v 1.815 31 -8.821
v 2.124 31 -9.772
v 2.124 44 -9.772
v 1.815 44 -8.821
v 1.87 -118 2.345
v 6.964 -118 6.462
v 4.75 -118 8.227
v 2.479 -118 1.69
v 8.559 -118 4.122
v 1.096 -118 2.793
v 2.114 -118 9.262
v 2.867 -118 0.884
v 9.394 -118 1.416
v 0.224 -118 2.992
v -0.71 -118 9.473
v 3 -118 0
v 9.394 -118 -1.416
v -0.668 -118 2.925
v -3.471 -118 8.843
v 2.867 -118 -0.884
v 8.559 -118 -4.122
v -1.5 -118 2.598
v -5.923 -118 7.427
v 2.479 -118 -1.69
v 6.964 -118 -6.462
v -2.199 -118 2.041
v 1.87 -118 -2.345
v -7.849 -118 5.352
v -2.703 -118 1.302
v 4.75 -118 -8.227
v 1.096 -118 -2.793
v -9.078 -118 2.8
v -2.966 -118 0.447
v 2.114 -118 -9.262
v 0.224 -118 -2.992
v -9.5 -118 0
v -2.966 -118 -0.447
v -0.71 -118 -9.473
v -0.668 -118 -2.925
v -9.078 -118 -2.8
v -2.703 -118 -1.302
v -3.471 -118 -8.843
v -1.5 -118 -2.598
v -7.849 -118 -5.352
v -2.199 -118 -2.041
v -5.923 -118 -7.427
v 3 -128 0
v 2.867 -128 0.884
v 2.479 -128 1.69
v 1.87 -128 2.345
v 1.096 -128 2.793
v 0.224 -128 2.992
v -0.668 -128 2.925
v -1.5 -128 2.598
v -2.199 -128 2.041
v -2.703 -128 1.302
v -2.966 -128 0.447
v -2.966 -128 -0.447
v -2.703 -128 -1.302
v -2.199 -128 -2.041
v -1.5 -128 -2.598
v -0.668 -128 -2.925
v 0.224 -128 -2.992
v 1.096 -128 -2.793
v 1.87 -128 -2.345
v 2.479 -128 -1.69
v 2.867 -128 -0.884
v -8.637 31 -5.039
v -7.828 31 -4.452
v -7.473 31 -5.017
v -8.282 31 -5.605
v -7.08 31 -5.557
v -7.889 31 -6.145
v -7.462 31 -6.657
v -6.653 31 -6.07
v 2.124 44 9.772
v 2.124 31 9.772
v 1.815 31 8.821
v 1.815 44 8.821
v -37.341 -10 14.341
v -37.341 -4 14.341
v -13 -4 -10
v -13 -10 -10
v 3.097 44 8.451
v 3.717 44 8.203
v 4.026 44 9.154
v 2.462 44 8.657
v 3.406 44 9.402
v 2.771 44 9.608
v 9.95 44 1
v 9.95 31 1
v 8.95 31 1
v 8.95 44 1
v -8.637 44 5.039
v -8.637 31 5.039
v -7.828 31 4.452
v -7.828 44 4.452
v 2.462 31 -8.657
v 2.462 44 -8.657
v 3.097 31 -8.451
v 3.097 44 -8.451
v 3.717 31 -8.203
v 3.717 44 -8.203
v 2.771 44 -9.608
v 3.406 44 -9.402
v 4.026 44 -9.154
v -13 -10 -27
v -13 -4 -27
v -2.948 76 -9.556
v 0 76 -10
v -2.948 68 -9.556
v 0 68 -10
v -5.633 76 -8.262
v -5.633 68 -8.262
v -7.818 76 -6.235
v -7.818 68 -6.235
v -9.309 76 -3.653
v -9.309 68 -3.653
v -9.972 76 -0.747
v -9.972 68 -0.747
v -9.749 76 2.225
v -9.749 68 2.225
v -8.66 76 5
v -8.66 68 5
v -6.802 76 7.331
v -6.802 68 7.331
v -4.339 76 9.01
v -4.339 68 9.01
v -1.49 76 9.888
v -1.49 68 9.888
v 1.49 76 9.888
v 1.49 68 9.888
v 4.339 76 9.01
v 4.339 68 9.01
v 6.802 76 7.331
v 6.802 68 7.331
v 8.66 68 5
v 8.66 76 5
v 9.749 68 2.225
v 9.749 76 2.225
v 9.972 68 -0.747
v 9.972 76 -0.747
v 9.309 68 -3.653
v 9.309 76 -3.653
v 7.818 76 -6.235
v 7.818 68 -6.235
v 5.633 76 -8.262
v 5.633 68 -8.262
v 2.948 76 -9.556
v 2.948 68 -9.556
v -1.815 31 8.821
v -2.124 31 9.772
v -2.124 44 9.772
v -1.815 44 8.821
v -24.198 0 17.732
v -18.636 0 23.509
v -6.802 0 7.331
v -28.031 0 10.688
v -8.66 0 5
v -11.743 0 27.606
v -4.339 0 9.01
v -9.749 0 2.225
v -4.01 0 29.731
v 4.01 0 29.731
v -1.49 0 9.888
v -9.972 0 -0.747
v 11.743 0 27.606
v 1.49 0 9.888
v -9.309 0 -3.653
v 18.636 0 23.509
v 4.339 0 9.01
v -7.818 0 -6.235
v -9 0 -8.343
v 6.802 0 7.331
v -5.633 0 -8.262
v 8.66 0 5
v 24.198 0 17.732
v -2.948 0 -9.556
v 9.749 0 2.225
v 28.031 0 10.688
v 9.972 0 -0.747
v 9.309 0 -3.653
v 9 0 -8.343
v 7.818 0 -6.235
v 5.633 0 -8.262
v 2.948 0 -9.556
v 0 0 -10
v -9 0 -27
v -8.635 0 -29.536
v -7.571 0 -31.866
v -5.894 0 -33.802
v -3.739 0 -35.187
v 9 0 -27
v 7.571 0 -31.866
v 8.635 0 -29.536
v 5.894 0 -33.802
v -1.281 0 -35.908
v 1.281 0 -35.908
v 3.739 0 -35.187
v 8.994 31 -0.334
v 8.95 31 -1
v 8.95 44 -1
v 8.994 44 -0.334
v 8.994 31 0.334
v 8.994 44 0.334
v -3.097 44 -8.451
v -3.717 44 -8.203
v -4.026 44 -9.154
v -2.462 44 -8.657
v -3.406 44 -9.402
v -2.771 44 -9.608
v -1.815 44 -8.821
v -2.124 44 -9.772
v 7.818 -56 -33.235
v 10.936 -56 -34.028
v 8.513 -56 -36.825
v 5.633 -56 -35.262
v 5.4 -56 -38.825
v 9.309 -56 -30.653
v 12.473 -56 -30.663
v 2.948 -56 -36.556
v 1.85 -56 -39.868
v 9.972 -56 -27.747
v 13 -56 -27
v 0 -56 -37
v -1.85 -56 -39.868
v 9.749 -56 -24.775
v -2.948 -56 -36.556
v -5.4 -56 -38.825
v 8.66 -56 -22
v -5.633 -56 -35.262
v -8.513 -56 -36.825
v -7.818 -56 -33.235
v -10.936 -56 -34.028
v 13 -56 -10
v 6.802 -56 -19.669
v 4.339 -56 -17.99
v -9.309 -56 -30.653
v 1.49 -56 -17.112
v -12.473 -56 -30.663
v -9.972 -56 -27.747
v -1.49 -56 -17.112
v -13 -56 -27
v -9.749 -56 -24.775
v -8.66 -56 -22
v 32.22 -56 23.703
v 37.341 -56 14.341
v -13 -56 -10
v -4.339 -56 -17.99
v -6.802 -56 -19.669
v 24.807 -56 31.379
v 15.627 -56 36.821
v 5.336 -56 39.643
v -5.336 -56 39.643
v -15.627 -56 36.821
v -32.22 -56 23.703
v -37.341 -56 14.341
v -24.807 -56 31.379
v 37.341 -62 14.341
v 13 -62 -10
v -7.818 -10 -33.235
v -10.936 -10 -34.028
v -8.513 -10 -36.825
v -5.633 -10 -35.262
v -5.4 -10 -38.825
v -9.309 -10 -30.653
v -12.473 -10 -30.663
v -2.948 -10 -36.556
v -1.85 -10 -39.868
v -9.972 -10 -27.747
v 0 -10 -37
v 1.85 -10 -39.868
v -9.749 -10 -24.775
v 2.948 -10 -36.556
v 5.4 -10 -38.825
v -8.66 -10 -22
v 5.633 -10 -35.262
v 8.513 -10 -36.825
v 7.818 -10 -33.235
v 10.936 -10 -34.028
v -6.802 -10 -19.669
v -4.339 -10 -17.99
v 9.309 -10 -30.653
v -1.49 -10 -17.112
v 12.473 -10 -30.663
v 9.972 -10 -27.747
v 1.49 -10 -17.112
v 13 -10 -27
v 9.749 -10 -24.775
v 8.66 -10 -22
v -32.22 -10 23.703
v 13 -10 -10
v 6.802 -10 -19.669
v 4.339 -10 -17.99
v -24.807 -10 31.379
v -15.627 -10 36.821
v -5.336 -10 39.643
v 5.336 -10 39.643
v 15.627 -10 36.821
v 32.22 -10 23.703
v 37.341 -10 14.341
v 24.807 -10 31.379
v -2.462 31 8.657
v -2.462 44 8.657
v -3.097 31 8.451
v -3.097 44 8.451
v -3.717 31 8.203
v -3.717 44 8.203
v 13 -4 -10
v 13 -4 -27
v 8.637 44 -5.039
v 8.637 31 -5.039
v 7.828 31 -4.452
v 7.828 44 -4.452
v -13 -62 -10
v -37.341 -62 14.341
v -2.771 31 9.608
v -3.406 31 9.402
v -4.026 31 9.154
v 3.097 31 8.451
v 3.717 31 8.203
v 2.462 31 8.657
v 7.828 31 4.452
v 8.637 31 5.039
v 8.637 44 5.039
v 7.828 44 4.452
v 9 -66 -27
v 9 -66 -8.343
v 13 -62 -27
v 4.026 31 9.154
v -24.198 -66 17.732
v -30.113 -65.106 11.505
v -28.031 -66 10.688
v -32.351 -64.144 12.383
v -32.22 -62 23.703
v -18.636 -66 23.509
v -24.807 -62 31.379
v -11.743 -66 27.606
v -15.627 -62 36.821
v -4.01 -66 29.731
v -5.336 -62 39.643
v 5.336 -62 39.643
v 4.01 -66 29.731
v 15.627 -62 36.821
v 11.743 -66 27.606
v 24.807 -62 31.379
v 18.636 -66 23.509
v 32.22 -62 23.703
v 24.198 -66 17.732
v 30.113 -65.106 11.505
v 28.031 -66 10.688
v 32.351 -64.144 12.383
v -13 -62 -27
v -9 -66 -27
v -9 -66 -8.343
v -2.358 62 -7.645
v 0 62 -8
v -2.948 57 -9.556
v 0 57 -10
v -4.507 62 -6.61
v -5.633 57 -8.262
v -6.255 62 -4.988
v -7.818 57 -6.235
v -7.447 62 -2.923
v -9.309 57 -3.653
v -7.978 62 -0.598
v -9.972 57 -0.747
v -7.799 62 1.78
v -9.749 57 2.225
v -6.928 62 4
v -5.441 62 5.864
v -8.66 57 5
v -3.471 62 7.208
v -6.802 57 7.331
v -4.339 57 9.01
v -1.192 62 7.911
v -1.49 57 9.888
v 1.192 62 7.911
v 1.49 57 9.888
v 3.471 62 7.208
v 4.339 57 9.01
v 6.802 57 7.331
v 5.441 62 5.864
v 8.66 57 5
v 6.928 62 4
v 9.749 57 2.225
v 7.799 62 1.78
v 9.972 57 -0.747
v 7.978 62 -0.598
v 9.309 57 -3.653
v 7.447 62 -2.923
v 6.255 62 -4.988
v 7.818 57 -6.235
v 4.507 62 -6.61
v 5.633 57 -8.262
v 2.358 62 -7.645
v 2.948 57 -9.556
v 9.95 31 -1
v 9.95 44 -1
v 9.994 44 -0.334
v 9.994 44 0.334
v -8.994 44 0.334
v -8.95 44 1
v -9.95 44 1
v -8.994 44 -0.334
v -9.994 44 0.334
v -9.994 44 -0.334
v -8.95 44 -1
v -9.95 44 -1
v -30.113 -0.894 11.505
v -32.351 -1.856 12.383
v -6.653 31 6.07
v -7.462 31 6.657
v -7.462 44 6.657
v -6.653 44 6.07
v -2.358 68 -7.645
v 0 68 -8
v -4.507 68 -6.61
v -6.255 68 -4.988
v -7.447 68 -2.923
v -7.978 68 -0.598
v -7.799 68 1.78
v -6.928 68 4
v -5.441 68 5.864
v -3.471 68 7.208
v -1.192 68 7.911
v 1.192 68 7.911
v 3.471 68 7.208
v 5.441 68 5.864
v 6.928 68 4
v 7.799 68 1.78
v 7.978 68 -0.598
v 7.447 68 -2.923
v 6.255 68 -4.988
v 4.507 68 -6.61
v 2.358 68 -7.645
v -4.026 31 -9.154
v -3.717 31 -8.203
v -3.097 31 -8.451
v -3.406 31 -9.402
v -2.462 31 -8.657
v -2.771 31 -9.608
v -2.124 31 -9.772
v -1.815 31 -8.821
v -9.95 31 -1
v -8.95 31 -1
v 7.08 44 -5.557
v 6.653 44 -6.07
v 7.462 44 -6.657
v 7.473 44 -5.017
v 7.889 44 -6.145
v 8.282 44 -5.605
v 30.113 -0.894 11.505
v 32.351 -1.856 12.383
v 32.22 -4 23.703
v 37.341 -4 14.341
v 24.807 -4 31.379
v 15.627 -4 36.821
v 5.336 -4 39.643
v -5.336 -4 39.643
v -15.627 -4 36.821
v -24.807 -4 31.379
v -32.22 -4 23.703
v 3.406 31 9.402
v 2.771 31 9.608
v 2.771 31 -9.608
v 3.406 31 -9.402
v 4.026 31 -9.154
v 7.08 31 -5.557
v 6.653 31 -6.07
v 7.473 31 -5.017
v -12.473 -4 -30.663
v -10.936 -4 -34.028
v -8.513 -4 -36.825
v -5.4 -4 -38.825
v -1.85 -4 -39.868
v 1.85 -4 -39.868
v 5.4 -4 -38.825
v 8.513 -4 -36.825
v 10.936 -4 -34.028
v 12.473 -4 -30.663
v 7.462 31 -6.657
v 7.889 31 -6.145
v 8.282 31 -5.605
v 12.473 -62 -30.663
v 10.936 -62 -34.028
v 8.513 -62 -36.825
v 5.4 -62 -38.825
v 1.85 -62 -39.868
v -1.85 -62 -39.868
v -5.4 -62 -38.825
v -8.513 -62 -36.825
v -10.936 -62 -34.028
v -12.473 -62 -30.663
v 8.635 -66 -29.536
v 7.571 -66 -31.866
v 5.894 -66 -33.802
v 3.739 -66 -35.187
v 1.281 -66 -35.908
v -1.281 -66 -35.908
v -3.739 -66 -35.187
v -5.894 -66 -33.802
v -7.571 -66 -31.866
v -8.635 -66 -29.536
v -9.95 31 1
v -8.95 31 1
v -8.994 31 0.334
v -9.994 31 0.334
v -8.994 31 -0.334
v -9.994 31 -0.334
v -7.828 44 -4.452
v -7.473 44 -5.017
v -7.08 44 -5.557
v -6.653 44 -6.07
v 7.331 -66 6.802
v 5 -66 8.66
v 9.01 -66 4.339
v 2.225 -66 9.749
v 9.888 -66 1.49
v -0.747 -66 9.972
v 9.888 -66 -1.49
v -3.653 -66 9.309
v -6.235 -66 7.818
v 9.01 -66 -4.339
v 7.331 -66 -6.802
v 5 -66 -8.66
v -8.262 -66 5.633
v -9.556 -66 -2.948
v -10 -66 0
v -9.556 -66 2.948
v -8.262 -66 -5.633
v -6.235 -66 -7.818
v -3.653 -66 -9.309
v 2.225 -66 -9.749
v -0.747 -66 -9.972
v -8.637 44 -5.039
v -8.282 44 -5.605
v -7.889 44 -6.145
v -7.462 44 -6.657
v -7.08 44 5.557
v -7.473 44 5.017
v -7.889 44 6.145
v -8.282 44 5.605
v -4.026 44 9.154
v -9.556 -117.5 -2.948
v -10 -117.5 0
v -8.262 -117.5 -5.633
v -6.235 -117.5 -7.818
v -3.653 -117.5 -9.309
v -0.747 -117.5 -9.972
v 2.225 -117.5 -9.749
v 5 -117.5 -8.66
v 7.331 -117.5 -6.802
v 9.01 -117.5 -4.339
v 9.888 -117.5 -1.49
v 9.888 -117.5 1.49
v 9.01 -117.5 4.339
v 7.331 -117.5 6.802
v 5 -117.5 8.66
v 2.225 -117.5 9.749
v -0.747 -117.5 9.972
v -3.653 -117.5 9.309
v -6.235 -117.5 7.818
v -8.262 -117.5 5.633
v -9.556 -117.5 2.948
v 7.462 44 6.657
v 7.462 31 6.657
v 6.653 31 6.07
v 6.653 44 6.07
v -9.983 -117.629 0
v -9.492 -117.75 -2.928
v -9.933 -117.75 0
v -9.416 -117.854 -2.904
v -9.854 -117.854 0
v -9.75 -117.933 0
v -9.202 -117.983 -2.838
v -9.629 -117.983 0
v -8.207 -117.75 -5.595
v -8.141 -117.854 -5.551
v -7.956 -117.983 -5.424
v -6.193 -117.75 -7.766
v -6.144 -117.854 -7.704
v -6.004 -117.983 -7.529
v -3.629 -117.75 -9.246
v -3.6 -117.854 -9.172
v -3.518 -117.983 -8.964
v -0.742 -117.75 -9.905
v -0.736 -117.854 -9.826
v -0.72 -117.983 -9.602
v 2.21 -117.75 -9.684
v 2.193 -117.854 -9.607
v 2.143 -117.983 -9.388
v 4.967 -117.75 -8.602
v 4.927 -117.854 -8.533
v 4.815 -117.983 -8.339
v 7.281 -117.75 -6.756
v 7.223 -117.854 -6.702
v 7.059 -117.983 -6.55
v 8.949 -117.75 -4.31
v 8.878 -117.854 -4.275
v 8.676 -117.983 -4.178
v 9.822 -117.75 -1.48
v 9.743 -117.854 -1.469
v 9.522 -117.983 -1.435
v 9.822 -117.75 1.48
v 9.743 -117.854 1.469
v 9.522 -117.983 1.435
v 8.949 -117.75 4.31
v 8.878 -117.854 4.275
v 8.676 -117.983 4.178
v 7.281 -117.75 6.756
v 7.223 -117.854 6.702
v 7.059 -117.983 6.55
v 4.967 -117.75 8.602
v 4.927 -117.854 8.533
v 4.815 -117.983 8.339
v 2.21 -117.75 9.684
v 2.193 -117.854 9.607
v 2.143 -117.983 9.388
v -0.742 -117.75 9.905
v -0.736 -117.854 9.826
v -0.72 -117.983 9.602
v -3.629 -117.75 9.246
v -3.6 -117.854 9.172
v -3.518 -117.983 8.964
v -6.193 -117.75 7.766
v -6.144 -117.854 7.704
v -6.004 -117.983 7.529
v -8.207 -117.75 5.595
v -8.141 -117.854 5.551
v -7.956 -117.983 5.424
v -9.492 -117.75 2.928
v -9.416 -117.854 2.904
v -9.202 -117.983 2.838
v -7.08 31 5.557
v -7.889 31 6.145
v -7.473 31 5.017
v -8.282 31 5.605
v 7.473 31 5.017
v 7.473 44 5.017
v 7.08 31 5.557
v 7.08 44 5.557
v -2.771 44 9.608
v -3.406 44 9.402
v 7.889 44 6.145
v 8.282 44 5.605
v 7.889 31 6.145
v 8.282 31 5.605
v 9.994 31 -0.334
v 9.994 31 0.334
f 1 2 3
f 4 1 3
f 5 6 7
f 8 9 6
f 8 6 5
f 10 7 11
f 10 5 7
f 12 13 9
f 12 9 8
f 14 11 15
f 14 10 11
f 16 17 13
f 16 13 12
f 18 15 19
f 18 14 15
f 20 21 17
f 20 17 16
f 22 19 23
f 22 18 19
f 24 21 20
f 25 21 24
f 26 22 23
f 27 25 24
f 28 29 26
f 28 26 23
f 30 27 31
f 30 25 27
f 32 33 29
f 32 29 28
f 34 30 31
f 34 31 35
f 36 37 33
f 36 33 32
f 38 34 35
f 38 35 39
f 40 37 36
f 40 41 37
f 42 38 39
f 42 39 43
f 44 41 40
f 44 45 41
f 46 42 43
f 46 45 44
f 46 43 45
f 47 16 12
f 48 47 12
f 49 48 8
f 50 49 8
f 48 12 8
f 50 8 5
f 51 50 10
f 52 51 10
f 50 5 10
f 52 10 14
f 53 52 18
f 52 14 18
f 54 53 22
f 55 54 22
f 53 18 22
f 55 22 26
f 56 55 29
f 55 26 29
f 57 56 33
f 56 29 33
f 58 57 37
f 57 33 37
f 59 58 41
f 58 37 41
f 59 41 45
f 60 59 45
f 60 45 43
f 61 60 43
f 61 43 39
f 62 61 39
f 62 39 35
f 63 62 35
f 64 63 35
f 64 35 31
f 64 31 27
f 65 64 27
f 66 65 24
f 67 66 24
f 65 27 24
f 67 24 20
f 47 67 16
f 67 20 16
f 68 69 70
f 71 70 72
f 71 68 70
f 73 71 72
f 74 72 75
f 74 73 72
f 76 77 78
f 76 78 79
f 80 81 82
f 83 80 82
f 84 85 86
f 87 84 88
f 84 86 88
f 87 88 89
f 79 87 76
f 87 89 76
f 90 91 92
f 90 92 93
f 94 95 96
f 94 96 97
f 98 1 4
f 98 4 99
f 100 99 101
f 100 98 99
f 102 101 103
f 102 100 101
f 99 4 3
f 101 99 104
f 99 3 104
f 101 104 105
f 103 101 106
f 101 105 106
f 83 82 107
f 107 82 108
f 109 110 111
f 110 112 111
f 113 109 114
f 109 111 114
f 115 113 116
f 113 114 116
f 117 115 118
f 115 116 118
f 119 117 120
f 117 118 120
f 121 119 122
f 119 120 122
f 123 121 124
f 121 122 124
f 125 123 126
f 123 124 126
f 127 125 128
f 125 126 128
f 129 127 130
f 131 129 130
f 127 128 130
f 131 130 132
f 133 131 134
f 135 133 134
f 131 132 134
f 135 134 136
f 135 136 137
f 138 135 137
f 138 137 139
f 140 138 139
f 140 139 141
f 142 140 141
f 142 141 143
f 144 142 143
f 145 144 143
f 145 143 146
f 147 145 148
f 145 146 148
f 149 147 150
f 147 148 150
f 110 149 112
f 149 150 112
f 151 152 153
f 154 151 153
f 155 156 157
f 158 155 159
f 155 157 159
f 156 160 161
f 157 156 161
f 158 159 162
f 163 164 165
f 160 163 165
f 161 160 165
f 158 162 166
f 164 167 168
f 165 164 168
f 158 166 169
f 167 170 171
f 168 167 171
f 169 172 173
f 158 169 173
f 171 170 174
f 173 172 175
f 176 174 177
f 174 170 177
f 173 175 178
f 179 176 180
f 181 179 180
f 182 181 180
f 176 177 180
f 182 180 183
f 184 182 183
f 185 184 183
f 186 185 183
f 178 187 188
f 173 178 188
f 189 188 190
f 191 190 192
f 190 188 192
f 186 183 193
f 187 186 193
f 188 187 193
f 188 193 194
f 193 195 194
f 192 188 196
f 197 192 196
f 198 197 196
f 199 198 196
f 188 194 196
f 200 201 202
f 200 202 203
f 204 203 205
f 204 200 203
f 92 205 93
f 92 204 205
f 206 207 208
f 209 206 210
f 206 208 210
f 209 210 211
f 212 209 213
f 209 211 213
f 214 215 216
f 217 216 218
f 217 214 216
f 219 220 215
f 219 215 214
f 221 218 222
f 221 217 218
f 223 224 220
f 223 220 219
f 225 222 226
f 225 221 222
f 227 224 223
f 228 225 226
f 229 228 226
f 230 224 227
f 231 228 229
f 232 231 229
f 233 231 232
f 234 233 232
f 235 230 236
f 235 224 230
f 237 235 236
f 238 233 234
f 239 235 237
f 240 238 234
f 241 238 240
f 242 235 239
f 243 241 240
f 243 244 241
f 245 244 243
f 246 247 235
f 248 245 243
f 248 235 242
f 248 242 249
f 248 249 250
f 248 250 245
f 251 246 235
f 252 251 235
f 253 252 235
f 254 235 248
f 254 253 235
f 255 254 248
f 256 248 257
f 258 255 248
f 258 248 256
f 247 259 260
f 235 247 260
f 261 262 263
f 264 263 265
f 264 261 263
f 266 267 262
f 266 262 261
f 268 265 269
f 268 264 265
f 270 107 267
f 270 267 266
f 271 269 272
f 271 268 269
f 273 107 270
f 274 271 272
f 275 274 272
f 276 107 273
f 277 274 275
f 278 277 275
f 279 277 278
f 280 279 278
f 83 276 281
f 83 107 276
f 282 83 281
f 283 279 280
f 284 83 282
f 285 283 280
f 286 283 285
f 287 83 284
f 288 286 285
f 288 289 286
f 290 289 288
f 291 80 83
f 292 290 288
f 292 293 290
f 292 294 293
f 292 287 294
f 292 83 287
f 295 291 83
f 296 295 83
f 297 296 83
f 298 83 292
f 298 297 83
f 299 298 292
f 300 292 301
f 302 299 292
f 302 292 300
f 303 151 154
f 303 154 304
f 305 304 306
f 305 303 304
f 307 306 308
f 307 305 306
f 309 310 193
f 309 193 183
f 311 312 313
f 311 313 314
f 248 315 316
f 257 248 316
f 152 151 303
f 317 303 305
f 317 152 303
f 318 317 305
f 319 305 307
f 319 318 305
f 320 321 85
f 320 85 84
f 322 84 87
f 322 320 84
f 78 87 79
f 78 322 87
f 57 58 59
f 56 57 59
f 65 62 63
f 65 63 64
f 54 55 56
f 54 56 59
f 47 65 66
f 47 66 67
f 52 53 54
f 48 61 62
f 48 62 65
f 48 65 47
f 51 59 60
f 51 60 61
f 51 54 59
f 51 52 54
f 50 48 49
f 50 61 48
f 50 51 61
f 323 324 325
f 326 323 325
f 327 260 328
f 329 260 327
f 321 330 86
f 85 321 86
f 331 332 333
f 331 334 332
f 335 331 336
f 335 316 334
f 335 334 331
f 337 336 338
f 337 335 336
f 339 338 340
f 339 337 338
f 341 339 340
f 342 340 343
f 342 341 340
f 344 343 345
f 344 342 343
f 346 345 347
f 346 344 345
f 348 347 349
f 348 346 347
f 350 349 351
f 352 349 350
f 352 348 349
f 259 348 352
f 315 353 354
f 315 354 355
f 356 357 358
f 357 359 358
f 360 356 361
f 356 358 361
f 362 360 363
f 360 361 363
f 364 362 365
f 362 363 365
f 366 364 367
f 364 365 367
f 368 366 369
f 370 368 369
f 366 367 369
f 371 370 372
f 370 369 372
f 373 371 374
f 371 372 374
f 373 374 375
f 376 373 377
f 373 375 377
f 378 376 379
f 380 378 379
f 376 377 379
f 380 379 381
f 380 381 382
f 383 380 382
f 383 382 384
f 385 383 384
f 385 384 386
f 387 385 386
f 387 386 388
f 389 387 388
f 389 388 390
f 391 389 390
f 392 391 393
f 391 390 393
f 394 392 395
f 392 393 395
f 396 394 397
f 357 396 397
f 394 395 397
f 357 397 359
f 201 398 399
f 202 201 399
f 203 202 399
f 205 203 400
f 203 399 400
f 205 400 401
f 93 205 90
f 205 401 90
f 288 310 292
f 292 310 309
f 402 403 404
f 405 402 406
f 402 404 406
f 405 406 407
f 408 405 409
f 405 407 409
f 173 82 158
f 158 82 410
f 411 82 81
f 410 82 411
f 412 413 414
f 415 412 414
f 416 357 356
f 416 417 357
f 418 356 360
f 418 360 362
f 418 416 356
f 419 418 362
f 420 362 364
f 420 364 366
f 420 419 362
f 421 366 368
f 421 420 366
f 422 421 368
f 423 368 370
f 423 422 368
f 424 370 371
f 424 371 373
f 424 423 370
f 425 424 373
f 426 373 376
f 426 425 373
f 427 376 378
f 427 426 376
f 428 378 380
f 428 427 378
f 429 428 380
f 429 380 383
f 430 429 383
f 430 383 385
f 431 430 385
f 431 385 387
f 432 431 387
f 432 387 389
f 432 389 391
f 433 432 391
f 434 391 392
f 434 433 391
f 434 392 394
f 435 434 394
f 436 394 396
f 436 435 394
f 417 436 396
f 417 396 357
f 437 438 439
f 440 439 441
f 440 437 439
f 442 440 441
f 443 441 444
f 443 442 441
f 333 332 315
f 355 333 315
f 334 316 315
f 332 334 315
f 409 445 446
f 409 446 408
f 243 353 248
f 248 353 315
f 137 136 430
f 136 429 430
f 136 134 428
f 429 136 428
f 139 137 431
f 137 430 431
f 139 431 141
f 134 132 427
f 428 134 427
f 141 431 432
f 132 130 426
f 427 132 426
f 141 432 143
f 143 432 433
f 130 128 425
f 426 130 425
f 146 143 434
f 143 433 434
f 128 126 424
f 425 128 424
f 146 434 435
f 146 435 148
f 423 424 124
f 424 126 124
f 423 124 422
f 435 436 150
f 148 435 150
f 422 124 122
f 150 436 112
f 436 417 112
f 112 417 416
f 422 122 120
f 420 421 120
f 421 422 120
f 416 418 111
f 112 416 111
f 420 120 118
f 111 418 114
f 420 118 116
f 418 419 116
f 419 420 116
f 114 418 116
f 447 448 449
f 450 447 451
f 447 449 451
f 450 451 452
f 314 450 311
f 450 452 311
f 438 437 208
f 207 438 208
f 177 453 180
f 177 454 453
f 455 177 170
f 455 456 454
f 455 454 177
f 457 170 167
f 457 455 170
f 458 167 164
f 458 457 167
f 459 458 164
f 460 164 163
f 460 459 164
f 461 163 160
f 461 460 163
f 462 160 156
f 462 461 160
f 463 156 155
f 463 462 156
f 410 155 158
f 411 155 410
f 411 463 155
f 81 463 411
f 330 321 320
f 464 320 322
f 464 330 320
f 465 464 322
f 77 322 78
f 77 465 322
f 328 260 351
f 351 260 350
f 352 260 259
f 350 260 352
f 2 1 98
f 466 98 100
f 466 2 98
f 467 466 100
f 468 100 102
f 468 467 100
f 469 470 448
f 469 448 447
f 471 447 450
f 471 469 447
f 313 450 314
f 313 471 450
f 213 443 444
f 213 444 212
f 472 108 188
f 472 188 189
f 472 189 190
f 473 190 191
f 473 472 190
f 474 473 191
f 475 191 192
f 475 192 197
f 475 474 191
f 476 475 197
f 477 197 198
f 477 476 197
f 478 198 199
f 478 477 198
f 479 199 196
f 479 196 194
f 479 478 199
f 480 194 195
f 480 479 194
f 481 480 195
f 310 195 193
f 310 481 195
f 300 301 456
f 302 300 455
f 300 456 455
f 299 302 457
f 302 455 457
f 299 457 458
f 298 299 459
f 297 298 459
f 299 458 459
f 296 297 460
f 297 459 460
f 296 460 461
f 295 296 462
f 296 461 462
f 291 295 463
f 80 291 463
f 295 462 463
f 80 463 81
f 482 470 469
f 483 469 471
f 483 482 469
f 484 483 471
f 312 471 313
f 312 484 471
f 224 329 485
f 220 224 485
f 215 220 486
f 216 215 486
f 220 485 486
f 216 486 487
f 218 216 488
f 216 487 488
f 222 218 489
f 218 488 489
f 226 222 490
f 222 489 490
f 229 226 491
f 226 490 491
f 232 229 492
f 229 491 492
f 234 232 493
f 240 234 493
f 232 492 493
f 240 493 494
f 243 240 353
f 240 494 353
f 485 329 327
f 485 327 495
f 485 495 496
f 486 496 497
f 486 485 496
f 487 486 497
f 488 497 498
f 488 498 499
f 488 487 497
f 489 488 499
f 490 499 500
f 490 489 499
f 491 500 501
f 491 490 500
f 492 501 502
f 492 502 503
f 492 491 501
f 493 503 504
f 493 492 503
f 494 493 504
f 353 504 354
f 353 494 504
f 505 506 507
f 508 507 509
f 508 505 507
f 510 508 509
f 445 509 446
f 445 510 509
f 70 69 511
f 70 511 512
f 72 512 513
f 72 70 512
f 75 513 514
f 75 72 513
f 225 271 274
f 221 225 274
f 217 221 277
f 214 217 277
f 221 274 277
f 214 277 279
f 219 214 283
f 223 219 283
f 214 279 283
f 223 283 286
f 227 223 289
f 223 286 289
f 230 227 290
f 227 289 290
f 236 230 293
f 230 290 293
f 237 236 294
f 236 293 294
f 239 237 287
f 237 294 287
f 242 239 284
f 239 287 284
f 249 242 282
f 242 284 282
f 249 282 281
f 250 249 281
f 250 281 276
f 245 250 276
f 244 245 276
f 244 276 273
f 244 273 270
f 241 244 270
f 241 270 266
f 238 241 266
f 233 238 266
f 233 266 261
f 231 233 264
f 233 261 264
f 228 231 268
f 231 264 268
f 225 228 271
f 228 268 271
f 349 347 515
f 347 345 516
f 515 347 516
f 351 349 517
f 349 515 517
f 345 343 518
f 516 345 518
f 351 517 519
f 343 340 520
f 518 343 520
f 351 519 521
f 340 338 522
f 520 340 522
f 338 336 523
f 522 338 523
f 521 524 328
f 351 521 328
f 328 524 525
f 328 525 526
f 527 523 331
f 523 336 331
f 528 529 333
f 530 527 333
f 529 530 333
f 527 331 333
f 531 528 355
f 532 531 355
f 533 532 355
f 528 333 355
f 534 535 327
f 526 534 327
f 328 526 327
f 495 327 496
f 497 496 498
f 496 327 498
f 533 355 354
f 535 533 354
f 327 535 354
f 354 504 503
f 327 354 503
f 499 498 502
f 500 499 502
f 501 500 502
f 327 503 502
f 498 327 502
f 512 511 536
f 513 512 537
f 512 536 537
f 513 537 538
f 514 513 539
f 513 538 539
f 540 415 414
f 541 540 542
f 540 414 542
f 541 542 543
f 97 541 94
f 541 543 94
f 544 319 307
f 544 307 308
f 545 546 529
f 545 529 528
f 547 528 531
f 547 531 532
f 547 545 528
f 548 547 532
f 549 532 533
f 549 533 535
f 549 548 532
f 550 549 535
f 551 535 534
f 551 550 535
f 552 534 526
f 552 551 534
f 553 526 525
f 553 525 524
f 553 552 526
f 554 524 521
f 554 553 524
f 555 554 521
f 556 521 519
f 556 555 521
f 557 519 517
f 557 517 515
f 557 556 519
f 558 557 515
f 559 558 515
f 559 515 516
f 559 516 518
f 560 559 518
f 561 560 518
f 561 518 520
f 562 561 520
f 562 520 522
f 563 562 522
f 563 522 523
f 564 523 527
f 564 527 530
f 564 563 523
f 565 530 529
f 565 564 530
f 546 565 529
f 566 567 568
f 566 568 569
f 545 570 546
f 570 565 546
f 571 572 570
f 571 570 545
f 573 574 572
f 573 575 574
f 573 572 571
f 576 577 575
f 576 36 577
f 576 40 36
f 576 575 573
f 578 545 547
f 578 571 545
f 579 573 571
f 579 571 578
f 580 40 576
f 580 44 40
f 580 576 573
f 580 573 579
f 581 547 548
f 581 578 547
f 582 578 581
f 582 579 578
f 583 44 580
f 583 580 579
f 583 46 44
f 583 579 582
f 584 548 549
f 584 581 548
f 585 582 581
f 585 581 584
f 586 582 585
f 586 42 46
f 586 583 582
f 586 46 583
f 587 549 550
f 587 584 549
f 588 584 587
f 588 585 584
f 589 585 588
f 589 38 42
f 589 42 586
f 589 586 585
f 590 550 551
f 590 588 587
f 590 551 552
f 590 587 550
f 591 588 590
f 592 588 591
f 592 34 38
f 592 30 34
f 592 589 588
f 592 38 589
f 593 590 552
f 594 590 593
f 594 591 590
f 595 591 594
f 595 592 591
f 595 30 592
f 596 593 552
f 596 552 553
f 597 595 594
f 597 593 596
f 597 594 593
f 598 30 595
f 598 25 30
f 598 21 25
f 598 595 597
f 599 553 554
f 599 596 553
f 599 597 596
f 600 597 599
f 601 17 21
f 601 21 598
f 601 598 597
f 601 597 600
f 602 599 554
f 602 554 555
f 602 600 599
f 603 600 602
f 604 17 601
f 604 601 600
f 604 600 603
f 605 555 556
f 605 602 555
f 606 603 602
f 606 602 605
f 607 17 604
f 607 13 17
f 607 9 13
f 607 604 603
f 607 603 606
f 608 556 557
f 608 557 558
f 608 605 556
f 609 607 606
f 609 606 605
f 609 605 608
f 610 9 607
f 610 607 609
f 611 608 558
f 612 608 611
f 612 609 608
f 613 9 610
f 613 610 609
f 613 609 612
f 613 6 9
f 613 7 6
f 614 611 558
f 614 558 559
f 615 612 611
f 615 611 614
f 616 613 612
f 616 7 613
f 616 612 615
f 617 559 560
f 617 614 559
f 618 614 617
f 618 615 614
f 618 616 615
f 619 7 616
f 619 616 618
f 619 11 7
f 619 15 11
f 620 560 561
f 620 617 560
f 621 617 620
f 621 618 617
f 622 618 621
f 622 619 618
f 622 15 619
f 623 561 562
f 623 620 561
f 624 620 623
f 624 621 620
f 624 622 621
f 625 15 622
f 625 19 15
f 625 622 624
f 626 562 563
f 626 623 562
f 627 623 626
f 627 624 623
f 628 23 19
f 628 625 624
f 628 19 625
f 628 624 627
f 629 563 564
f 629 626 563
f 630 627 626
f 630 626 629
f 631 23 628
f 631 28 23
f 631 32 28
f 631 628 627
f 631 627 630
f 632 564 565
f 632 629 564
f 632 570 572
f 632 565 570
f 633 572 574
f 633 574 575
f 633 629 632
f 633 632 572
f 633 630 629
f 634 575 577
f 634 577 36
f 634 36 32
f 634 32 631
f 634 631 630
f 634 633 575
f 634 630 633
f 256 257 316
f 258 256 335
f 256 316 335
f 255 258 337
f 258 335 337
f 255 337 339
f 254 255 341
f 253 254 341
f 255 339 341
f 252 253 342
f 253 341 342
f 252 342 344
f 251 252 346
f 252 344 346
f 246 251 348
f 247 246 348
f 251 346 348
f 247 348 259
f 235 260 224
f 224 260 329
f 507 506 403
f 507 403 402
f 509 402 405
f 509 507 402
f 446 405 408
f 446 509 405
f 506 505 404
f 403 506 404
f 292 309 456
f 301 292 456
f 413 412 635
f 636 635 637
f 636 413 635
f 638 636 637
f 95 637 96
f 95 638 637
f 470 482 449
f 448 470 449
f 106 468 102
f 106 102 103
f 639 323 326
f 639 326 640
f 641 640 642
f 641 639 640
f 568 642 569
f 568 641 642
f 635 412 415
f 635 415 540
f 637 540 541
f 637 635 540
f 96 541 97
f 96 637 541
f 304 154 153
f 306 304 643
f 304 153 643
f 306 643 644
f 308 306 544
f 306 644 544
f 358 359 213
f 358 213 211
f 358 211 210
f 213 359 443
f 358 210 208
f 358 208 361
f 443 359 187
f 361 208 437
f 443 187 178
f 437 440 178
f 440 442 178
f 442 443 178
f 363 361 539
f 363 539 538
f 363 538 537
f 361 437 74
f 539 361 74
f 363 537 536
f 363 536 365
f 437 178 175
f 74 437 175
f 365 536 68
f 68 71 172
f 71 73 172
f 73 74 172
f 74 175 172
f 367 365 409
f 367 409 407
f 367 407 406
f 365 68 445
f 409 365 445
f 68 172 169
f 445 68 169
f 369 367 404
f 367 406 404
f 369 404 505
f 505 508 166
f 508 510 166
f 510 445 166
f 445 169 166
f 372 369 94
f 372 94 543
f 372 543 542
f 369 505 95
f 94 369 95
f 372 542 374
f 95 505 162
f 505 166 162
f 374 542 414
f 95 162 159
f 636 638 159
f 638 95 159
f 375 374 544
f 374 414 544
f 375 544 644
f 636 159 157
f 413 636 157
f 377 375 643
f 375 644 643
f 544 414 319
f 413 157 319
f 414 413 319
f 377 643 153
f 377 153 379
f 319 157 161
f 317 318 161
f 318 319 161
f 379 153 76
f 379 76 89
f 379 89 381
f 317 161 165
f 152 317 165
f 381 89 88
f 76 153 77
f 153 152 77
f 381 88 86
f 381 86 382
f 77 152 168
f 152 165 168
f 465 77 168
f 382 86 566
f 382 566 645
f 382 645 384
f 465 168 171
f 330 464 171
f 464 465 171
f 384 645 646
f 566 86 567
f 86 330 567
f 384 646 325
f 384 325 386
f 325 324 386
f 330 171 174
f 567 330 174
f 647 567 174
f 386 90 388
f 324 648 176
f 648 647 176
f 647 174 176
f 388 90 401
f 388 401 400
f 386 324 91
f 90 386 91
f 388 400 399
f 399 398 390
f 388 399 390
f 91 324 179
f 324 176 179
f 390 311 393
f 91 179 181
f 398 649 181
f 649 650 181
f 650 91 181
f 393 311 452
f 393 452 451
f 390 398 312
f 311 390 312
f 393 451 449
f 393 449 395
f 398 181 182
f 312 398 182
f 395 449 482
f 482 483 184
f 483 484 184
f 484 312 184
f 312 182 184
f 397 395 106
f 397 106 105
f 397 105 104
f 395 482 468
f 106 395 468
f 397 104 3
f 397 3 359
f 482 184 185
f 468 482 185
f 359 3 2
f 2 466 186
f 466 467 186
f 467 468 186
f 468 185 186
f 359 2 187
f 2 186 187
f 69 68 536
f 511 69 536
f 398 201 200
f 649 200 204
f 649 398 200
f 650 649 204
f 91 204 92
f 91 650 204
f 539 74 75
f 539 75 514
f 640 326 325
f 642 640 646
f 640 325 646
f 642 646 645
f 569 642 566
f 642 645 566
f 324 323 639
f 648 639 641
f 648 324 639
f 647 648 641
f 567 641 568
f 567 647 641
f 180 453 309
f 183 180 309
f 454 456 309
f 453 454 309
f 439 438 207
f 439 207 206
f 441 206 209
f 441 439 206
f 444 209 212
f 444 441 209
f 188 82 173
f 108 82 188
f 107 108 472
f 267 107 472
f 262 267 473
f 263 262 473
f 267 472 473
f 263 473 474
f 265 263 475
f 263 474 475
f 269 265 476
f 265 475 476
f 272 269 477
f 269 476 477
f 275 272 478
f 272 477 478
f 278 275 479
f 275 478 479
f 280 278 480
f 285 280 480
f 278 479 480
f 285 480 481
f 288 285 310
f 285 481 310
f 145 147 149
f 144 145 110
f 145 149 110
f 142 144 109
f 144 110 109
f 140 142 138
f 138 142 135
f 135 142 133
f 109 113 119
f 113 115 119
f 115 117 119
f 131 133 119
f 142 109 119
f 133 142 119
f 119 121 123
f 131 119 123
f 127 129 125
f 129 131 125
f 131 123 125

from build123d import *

# Parameters (mm, degrees)
SKETCH1_W                 = 6
SKETCH1_H                 = 8
CUT_EXTRUDE1_REACH        = 80.305
CUT_EXTRUDE1_START_RADIUS = 10
CUT_EXTRUDE1_END_RADIUS   = 10
SKETCH2_W                 = 13
SKETCH2_H                 = 2
CIRPATTERN1_COUNT         = 10
SKETCH3_R                 = 10
BOSS_EXTRUDE1_DEPTH       = 10
CHAMFER2_SIZE             = 4
CHAMFER6_SIZE             = 10
CHAMFER6_SIZE2            = 4
CHAMFER3_SIZE             = 4
CHAMFER5_SIZE             = 4
BODY_MOVE_COPY2_ANGLE     = 180
SKETCH5_R                 = 10
BOSS_EXTRUDE2_DEPTH       = 46
BOSS_EXTRUDE3_START       = 52
SKETCH6_R                 = 10
BOSS_EXTRUDE3_DEPTH       = 52
BOSS_EXTRUDE4_START       = 52
SKETCH6_3_R               = 3
BOSS_EXTRUDE4_DEPTH       = 10
FILLET1_R                 = 0.5


with BuildPart() as part:
    # Sketch1 → Revolve1 (revolve)
    with BuildSketch(Plane.YZ, mode=Mode.PRIVATE) as revolve1_sk:
        Polygon((57, 10), (0, 10), (0, 0), (62, 0), (62, 8), align=None)
        with Locations((65, 4)):
            Rectangle(SKETCH1_W, SKETCH1_H)
        Polygon((68, 10), (68, 8), (68, 0), (76, 0), (76, 10), align=None)
    revolve(revolve1_sk.sketch.rotate(Axis((0, -74.081666102, 0), (0, 1, 0)), 180), axis=Axis((0, -74.081666102, 0), (0, 1, 0)))

    # Cut-Extrude1: from a cylinder face, 80.305 long prism both ways, kept between that surface and its translate by the depth
    cut_extrude1_start = Plane(origin=(0, 37.5, 0), z_dir=(0, -1, 0)) * Cylinder(CUT_EXTRUDE1_START_RADIUS, 181.61, mode=Mode.PRIVATE)
    cut_extrude1_end = Plane(origin=(-1, 37.5, 0), z_dir=(0, -1, 0)) * Cylinder(CUT_EXTRUDE1_END_RADIUS, 181.61, mode=Mode.PRIVATE)
    # Sketch2 → Cut-Extrude1 (cut, from a surface)
    with BuildSketch(Plane.YZ, mode=Mode.PRIVATE) as cut_extrude1_sk1:
        with Locations((37.5, 0)):
            Rectangle(SKETCH2_W, SKETCH2_H)
    cut_extrude1_tool1 = extrude(cut_extrude1_sk1.sketch, amount=CUT_EXTRUDE1_REACH, both=True, mode=Mode.PRIVATE)
    cut_extrude1 = ((cut_extrude1_tool1 & cut_extrude1_start) - cut_extrude1_end).solids().sort_by_distance((9.449874, 37.5, 0))[0]
    add(cut_extrude1, mode=Mode.SUBTRACT)

    # CirPattern1: Cut-Extrude1 ×10 about axis
    cirpattern1_axis = Axis((0, 0, 0), (0, 1, 0))
    for i in range(1, CIRPATTERN1_COUNT):
        add(cut_extrude1.rotate(cirpattern1_axis, i * 360 / CIRPATTERN1_COUNT), mode=Mode.SUBTRACT)


with BuildPart() as body_2:
    # Sketch3 → Boss-Extrude1 (new body)
    # profile 1 of 2: a face of its own
    with BuildSketch(Plane.XZ):
        with BuildLine():
            Line((-37.340859119, 14.340859119), (-13, -10))
            Line((-13, -10), (-13, -27))
            ThreePointArc((-13, -27), (0, -40), (13, -27))
            Line((13, -27), (13, -10))
            Line((13, -10), (37.340859119, 14.340859119))
            ThreePointArc((37.340859119, 14.340859119), (0, 40), (-37.340859119, 14.340859119))
        make_face()
        with Locations(Location((0, 0, 0), (0, 0, 270))):
            Circle(SKETCH3_R, mode=Mode.SUBTRACT)
    # profile 2 of 2: a face of its own
    with BuildSketch(Plane.XZ):
        with Locations(Location((0, 0, 0), (0, 0, 270))):
            Circle(SKETCH3_R)
    extrude(amount=BOSS_EXTRUDE1_DEPTH)

    # Chamfer2
    chamfer2_edges = [body_2.edges().sort_by_distance(p)[0] for p in [
        (-13, 0, -18.5),
        (13, 0, -18.5),
        (0, 0, -40),
    ]]
    chamfer(chamfer2_edges, length=CHAMFER2_SIZE)

    # Chamfer6
    chamfer6_edges = [body_2.edges().sort_by_distance(p)[0] for p in [
        (0, 0, 40),
    ]]
    chamfer6_side = [body_2.faces().sort_by_distance(p)[0] for p in [
        (0, 0, 9.789093574),
    ]]
    chamfer(chamfer6_edges, length=CHAMFER6_SIZE, length2=CHAMFER6_SIZE2, reference=chamfer6_side[0])

    # Chamfer3
    chamfer3_edges = [body_2.edges().sort_by_distance(p)[0] for p in [
        (19.162771735, 0, -3.837228265),
    ]]
    chamfer(chamfer3_edges, length=CHAMFER3_SIZE)

    # Chamfer5
    chamfer5_edges = [body_2.edges().sort_by_distance(p)[0] for p in [
        (-19.162771735, 0, -3.837228265),
    ]]
    chamfer(chamfer5_edges, length=CHAMFER5_SIZE)


with BuildPart() as body_3:
    # Body-Move/Copy1: copy of body 2
    add(body_2.part.moved(Location((0, -36, 0))))


with BuildPart() as body_3_1:
    # Body-Move/Copy2: moved
    add(body_3.part.rotate(Axis((0, -51, 0), (0, 0, 1)), BODY_MOVE_COPY2_ANGLE))


with BuildPart() as body_2_1:
    add(body_2.part)

    add(body_3_1.part)  # Boss-Extrude2 merges body 3
    # Sketch5 → Boss-Extrude2 (add)
    with BuildSketch(Plane.XZ.offset(10)):
        with Locations(Location((0, -27, 0), (0, 0, 270))):
            Circle(SKETCH5_R)
    extrude(amount=BOSS_EXTRUDE2_DEPTH)

    # Sketch6 → Boss-Extrude3 (add)
    with BuildSketch(Plane.XZ.offset(66).offset(BOSS_EXTRUDE3_START)):
        with Locations(Location((0, 0, 0), (0, 0, 180))):
            Circle(SKETCH6_R)
    extrude(amount=-BOSS_EXTRUDE3_DEPTH)

    # Sketch6<3> → Boss-Extrude4 (add)
    with BuildSketch(Plane.XZ.offset(66).offset(BOSS_EXTRUDE4_START)):
        Circle(SKETCH6_3_R)
    extrude(amount=BOSS_EXTRUDE4_DEPTH)

    # Fillet1
    fillet1_edges = [body_2_1.edges().sort_by_distance(p)[0] for p in [
        (10, -118, 0),
    ]]
    fillet(fillet1_edges, radius=FILLET1_R)


with BuildPart() as part_1:
    add(part.part)

    # Combine1: union body 2
    add(body_2_1.part)


solid = part_1.part
